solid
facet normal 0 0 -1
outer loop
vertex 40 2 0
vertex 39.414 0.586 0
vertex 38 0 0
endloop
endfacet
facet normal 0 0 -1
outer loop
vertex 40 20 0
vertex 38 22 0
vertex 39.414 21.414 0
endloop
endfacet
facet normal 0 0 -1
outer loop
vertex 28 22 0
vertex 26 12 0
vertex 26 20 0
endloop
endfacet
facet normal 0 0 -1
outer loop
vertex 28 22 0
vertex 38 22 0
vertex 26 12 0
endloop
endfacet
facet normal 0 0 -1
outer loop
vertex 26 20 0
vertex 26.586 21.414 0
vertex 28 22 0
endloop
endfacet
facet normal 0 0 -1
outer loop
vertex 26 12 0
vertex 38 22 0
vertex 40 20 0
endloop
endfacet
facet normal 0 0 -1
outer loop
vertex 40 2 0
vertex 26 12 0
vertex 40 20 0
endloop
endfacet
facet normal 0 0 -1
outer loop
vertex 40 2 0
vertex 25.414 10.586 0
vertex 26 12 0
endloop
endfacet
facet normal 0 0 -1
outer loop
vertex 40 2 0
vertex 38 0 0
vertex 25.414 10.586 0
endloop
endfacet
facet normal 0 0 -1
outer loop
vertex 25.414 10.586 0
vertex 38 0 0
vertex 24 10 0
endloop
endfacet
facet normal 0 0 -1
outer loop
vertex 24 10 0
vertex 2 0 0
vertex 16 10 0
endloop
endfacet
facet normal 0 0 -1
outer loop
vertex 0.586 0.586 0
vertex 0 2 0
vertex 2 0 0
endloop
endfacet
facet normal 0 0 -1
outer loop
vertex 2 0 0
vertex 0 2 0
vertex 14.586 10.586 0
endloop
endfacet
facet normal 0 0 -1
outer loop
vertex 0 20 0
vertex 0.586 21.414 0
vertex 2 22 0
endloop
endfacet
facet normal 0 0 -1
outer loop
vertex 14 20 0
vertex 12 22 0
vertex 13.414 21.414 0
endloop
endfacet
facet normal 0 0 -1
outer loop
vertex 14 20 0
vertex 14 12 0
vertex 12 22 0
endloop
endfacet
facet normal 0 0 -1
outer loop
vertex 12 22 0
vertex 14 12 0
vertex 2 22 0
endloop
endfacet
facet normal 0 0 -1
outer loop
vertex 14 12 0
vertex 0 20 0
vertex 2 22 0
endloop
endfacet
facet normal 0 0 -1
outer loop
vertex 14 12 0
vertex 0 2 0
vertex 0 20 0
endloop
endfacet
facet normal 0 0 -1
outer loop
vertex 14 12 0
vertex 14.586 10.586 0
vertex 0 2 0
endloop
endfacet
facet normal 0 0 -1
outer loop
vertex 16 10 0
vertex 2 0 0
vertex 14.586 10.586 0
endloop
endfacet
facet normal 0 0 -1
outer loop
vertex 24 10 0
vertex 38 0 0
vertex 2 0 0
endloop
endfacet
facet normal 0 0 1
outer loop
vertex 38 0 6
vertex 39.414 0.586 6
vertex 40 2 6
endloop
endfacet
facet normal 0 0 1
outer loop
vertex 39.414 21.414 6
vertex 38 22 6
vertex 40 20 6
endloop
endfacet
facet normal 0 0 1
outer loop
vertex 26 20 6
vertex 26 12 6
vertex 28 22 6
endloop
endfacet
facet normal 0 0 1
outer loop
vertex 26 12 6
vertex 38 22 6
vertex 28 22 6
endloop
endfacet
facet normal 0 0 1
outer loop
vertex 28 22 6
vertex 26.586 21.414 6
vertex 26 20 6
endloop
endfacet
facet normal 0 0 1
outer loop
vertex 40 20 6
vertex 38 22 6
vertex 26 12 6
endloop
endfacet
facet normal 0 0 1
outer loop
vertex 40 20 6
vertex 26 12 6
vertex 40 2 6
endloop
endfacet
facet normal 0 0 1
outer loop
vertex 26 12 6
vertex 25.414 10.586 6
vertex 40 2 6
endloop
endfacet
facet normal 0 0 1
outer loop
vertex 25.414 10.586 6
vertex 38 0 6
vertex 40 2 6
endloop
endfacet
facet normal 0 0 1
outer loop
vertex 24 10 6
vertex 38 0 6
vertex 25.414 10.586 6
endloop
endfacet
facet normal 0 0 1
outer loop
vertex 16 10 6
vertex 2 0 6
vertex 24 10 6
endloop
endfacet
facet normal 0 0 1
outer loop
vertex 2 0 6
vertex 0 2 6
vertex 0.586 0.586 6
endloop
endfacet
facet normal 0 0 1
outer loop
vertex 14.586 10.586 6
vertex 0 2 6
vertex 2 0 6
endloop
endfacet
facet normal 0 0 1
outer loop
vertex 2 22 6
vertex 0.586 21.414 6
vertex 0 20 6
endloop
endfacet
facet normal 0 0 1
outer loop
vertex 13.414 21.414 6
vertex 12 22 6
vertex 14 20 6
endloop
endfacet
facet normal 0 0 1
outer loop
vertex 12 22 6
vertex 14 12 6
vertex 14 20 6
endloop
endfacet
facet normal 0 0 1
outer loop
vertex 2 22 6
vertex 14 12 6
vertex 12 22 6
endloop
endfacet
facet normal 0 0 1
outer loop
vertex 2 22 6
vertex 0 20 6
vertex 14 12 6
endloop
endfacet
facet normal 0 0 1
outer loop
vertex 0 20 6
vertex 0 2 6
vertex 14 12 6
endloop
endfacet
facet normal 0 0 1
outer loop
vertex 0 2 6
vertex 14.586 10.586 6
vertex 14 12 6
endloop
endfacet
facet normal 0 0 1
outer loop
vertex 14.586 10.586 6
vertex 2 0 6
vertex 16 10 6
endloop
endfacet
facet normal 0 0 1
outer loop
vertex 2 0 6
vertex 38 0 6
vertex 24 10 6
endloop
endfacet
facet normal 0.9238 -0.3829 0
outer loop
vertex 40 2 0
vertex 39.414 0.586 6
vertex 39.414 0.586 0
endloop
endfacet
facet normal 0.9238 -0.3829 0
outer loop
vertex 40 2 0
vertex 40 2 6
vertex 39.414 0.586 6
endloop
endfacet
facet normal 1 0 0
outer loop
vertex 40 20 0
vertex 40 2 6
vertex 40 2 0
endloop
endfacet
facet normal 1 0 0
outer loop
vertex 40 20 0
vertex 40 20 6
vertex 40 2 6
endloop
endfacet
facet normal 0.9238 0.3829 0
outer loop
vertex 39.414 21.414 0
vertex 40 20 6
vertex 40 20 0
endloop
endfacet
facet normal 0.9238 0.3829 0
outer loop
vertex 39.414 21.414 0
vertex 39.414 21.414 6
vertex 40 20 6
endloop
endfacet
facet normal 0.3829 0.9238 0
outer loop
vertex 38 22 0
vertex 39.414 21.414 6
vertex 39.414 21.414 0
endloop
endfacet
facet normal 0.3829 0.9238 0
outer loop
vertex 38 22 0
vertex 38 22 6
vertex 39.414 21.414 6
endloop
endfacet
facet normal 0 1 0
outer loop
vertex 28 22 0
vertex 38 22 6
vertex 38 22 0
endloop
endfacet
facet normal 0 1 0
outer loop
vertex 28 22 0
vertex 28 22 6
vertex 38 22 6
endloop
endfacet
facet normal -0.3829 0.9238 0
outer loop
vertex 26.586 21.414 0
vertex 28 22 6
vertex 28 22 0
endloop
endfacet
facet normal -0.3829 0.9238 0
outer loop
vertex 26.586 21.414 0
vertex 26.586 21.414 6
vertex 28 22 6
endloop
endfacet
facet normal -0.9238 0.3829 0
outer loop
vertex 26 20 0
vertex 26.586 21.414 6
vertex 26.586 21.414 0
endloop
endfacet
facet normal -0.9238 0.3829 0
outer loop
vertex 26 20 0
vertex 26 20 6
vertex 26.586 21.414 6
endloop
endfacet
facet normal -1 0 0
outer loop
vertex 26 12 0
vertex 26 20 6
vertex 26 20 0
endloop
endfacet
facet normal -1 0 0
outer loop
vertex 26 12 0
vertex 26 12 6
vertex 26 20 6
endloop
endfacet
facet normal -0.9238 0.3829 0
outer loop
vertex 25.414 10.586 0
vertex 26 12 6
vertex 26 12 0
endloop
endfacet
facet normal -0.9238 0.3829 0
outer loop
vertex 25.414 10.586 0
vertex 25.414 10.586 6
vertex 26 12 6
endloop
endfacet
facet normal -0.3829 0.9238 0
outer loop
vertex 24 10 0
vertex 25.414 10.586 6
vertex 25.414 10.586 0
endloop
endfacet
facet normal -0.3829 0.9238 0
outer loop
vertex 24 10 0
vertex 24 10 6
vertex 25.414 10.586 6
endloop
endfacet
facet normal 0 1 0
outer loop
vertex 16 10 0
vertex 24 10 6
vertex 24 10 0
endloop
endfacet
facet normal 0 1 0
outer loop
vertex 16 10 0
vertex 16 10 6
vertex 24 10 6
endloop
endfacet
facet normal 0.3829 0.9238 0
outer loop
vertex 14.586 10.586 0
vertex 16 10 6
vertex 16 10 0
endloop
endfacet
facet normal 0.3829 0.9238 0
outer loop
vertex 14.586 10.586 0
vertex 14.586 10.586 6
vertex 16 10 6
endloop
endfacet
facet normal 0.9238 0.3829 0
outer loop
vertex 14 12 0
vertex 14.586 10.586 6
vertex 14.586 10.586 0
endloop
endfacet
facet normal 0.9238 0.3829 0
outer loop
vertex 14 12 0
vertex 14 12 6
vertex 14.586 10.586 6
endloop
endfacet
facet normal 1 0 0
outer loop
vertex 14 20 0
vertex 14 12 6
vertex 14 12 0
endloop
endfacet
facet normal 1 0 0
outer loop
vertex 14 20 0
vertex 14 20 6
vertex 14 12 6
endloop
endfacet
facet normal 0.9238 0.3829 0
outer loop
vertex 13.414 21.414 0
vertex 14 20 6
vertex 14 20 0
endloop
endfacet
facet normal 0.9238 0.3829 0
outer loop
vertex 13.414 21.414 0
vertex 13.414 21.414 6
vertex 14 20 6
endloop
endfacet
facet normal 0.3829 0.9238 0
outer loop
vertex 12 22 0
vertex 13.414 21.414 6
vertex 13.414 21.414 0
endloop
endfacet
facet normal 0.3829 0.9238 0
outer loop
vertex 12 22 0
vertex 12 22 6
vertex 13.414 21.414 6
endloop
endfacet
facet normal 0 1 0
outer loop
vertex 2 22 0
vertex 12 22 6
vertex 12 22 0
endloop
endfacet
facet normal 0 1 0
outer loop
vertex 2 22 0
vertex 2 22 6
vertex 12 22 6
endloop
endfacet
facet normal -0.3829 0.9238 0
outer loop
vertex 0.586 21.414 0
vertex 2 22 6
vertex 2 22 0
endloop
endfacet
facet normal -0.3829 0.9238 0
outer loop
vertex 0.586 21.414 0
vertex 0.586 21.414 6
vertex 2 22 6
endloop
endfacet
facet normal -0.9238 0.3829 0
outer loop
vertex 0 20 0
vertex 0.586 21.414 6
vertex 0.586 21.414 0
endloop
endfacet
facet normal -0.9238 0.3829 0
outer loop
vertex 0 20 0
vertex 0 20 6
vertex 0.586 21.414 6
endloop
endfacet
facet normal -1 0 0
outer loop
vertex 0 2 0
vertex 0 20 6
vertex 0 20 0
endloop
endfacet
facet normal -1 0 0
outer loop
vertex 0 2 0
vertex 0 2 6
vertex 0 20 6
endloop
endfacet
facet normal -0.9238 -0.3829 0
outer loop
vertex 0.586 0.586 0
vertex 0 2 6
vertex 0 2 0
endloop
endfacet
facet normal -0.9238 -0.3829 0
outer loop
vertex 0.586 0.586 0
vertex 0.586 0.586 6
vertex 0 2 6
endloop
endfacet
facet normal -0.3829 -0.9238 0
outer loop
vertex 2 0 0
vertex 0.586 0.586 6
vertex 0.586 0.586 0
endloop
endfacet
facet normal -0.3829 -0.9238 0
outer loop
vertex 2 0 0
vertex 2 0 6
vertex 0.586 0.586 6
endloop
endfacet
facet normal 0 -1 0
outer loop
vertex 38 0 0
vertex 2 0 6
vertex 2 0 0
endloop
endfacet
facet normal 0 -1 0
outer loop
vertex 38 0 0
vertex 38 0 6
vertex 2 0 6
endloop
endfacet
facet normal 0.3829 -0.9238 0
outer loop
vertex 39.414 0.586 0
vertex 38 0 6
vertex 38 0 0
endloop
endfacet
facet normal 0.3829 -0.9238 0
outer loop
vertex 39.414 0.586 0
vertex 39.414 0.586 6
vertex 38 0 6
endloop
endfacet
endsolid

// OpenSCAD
$fn = 32;

// ----------------------------------------------------------------------
// Eye lug: clevis, 6 mm thick
// ----------------------------------------------------------------------

// --- parameters (mm) ---
profile_height = 6;       // extrusion height
profile_points = 24;      // points of the closed outline

profile = [[0, 2], [0.586, 0.586], [2, 0], [38, 0], [39.414, 0.586], [40, 2], [40, 20], [39.414, 21.414], [38, 22], [28, 22], [26.586, 21.414], [26, 20], [26, 12], [25.414, 10.586], [24, 10], [16, 10], [14.586, 10.586], [14, 12], [14, 20], [13.414, 21.414], [12, 22], [2, 22], [0.586, 21.414], [0, 20]];  // single closed polygon, 24 points, counter clockwise

// --- the one profile operation ---
linear_extrude(height = profile_height) polygon(points = profile);
